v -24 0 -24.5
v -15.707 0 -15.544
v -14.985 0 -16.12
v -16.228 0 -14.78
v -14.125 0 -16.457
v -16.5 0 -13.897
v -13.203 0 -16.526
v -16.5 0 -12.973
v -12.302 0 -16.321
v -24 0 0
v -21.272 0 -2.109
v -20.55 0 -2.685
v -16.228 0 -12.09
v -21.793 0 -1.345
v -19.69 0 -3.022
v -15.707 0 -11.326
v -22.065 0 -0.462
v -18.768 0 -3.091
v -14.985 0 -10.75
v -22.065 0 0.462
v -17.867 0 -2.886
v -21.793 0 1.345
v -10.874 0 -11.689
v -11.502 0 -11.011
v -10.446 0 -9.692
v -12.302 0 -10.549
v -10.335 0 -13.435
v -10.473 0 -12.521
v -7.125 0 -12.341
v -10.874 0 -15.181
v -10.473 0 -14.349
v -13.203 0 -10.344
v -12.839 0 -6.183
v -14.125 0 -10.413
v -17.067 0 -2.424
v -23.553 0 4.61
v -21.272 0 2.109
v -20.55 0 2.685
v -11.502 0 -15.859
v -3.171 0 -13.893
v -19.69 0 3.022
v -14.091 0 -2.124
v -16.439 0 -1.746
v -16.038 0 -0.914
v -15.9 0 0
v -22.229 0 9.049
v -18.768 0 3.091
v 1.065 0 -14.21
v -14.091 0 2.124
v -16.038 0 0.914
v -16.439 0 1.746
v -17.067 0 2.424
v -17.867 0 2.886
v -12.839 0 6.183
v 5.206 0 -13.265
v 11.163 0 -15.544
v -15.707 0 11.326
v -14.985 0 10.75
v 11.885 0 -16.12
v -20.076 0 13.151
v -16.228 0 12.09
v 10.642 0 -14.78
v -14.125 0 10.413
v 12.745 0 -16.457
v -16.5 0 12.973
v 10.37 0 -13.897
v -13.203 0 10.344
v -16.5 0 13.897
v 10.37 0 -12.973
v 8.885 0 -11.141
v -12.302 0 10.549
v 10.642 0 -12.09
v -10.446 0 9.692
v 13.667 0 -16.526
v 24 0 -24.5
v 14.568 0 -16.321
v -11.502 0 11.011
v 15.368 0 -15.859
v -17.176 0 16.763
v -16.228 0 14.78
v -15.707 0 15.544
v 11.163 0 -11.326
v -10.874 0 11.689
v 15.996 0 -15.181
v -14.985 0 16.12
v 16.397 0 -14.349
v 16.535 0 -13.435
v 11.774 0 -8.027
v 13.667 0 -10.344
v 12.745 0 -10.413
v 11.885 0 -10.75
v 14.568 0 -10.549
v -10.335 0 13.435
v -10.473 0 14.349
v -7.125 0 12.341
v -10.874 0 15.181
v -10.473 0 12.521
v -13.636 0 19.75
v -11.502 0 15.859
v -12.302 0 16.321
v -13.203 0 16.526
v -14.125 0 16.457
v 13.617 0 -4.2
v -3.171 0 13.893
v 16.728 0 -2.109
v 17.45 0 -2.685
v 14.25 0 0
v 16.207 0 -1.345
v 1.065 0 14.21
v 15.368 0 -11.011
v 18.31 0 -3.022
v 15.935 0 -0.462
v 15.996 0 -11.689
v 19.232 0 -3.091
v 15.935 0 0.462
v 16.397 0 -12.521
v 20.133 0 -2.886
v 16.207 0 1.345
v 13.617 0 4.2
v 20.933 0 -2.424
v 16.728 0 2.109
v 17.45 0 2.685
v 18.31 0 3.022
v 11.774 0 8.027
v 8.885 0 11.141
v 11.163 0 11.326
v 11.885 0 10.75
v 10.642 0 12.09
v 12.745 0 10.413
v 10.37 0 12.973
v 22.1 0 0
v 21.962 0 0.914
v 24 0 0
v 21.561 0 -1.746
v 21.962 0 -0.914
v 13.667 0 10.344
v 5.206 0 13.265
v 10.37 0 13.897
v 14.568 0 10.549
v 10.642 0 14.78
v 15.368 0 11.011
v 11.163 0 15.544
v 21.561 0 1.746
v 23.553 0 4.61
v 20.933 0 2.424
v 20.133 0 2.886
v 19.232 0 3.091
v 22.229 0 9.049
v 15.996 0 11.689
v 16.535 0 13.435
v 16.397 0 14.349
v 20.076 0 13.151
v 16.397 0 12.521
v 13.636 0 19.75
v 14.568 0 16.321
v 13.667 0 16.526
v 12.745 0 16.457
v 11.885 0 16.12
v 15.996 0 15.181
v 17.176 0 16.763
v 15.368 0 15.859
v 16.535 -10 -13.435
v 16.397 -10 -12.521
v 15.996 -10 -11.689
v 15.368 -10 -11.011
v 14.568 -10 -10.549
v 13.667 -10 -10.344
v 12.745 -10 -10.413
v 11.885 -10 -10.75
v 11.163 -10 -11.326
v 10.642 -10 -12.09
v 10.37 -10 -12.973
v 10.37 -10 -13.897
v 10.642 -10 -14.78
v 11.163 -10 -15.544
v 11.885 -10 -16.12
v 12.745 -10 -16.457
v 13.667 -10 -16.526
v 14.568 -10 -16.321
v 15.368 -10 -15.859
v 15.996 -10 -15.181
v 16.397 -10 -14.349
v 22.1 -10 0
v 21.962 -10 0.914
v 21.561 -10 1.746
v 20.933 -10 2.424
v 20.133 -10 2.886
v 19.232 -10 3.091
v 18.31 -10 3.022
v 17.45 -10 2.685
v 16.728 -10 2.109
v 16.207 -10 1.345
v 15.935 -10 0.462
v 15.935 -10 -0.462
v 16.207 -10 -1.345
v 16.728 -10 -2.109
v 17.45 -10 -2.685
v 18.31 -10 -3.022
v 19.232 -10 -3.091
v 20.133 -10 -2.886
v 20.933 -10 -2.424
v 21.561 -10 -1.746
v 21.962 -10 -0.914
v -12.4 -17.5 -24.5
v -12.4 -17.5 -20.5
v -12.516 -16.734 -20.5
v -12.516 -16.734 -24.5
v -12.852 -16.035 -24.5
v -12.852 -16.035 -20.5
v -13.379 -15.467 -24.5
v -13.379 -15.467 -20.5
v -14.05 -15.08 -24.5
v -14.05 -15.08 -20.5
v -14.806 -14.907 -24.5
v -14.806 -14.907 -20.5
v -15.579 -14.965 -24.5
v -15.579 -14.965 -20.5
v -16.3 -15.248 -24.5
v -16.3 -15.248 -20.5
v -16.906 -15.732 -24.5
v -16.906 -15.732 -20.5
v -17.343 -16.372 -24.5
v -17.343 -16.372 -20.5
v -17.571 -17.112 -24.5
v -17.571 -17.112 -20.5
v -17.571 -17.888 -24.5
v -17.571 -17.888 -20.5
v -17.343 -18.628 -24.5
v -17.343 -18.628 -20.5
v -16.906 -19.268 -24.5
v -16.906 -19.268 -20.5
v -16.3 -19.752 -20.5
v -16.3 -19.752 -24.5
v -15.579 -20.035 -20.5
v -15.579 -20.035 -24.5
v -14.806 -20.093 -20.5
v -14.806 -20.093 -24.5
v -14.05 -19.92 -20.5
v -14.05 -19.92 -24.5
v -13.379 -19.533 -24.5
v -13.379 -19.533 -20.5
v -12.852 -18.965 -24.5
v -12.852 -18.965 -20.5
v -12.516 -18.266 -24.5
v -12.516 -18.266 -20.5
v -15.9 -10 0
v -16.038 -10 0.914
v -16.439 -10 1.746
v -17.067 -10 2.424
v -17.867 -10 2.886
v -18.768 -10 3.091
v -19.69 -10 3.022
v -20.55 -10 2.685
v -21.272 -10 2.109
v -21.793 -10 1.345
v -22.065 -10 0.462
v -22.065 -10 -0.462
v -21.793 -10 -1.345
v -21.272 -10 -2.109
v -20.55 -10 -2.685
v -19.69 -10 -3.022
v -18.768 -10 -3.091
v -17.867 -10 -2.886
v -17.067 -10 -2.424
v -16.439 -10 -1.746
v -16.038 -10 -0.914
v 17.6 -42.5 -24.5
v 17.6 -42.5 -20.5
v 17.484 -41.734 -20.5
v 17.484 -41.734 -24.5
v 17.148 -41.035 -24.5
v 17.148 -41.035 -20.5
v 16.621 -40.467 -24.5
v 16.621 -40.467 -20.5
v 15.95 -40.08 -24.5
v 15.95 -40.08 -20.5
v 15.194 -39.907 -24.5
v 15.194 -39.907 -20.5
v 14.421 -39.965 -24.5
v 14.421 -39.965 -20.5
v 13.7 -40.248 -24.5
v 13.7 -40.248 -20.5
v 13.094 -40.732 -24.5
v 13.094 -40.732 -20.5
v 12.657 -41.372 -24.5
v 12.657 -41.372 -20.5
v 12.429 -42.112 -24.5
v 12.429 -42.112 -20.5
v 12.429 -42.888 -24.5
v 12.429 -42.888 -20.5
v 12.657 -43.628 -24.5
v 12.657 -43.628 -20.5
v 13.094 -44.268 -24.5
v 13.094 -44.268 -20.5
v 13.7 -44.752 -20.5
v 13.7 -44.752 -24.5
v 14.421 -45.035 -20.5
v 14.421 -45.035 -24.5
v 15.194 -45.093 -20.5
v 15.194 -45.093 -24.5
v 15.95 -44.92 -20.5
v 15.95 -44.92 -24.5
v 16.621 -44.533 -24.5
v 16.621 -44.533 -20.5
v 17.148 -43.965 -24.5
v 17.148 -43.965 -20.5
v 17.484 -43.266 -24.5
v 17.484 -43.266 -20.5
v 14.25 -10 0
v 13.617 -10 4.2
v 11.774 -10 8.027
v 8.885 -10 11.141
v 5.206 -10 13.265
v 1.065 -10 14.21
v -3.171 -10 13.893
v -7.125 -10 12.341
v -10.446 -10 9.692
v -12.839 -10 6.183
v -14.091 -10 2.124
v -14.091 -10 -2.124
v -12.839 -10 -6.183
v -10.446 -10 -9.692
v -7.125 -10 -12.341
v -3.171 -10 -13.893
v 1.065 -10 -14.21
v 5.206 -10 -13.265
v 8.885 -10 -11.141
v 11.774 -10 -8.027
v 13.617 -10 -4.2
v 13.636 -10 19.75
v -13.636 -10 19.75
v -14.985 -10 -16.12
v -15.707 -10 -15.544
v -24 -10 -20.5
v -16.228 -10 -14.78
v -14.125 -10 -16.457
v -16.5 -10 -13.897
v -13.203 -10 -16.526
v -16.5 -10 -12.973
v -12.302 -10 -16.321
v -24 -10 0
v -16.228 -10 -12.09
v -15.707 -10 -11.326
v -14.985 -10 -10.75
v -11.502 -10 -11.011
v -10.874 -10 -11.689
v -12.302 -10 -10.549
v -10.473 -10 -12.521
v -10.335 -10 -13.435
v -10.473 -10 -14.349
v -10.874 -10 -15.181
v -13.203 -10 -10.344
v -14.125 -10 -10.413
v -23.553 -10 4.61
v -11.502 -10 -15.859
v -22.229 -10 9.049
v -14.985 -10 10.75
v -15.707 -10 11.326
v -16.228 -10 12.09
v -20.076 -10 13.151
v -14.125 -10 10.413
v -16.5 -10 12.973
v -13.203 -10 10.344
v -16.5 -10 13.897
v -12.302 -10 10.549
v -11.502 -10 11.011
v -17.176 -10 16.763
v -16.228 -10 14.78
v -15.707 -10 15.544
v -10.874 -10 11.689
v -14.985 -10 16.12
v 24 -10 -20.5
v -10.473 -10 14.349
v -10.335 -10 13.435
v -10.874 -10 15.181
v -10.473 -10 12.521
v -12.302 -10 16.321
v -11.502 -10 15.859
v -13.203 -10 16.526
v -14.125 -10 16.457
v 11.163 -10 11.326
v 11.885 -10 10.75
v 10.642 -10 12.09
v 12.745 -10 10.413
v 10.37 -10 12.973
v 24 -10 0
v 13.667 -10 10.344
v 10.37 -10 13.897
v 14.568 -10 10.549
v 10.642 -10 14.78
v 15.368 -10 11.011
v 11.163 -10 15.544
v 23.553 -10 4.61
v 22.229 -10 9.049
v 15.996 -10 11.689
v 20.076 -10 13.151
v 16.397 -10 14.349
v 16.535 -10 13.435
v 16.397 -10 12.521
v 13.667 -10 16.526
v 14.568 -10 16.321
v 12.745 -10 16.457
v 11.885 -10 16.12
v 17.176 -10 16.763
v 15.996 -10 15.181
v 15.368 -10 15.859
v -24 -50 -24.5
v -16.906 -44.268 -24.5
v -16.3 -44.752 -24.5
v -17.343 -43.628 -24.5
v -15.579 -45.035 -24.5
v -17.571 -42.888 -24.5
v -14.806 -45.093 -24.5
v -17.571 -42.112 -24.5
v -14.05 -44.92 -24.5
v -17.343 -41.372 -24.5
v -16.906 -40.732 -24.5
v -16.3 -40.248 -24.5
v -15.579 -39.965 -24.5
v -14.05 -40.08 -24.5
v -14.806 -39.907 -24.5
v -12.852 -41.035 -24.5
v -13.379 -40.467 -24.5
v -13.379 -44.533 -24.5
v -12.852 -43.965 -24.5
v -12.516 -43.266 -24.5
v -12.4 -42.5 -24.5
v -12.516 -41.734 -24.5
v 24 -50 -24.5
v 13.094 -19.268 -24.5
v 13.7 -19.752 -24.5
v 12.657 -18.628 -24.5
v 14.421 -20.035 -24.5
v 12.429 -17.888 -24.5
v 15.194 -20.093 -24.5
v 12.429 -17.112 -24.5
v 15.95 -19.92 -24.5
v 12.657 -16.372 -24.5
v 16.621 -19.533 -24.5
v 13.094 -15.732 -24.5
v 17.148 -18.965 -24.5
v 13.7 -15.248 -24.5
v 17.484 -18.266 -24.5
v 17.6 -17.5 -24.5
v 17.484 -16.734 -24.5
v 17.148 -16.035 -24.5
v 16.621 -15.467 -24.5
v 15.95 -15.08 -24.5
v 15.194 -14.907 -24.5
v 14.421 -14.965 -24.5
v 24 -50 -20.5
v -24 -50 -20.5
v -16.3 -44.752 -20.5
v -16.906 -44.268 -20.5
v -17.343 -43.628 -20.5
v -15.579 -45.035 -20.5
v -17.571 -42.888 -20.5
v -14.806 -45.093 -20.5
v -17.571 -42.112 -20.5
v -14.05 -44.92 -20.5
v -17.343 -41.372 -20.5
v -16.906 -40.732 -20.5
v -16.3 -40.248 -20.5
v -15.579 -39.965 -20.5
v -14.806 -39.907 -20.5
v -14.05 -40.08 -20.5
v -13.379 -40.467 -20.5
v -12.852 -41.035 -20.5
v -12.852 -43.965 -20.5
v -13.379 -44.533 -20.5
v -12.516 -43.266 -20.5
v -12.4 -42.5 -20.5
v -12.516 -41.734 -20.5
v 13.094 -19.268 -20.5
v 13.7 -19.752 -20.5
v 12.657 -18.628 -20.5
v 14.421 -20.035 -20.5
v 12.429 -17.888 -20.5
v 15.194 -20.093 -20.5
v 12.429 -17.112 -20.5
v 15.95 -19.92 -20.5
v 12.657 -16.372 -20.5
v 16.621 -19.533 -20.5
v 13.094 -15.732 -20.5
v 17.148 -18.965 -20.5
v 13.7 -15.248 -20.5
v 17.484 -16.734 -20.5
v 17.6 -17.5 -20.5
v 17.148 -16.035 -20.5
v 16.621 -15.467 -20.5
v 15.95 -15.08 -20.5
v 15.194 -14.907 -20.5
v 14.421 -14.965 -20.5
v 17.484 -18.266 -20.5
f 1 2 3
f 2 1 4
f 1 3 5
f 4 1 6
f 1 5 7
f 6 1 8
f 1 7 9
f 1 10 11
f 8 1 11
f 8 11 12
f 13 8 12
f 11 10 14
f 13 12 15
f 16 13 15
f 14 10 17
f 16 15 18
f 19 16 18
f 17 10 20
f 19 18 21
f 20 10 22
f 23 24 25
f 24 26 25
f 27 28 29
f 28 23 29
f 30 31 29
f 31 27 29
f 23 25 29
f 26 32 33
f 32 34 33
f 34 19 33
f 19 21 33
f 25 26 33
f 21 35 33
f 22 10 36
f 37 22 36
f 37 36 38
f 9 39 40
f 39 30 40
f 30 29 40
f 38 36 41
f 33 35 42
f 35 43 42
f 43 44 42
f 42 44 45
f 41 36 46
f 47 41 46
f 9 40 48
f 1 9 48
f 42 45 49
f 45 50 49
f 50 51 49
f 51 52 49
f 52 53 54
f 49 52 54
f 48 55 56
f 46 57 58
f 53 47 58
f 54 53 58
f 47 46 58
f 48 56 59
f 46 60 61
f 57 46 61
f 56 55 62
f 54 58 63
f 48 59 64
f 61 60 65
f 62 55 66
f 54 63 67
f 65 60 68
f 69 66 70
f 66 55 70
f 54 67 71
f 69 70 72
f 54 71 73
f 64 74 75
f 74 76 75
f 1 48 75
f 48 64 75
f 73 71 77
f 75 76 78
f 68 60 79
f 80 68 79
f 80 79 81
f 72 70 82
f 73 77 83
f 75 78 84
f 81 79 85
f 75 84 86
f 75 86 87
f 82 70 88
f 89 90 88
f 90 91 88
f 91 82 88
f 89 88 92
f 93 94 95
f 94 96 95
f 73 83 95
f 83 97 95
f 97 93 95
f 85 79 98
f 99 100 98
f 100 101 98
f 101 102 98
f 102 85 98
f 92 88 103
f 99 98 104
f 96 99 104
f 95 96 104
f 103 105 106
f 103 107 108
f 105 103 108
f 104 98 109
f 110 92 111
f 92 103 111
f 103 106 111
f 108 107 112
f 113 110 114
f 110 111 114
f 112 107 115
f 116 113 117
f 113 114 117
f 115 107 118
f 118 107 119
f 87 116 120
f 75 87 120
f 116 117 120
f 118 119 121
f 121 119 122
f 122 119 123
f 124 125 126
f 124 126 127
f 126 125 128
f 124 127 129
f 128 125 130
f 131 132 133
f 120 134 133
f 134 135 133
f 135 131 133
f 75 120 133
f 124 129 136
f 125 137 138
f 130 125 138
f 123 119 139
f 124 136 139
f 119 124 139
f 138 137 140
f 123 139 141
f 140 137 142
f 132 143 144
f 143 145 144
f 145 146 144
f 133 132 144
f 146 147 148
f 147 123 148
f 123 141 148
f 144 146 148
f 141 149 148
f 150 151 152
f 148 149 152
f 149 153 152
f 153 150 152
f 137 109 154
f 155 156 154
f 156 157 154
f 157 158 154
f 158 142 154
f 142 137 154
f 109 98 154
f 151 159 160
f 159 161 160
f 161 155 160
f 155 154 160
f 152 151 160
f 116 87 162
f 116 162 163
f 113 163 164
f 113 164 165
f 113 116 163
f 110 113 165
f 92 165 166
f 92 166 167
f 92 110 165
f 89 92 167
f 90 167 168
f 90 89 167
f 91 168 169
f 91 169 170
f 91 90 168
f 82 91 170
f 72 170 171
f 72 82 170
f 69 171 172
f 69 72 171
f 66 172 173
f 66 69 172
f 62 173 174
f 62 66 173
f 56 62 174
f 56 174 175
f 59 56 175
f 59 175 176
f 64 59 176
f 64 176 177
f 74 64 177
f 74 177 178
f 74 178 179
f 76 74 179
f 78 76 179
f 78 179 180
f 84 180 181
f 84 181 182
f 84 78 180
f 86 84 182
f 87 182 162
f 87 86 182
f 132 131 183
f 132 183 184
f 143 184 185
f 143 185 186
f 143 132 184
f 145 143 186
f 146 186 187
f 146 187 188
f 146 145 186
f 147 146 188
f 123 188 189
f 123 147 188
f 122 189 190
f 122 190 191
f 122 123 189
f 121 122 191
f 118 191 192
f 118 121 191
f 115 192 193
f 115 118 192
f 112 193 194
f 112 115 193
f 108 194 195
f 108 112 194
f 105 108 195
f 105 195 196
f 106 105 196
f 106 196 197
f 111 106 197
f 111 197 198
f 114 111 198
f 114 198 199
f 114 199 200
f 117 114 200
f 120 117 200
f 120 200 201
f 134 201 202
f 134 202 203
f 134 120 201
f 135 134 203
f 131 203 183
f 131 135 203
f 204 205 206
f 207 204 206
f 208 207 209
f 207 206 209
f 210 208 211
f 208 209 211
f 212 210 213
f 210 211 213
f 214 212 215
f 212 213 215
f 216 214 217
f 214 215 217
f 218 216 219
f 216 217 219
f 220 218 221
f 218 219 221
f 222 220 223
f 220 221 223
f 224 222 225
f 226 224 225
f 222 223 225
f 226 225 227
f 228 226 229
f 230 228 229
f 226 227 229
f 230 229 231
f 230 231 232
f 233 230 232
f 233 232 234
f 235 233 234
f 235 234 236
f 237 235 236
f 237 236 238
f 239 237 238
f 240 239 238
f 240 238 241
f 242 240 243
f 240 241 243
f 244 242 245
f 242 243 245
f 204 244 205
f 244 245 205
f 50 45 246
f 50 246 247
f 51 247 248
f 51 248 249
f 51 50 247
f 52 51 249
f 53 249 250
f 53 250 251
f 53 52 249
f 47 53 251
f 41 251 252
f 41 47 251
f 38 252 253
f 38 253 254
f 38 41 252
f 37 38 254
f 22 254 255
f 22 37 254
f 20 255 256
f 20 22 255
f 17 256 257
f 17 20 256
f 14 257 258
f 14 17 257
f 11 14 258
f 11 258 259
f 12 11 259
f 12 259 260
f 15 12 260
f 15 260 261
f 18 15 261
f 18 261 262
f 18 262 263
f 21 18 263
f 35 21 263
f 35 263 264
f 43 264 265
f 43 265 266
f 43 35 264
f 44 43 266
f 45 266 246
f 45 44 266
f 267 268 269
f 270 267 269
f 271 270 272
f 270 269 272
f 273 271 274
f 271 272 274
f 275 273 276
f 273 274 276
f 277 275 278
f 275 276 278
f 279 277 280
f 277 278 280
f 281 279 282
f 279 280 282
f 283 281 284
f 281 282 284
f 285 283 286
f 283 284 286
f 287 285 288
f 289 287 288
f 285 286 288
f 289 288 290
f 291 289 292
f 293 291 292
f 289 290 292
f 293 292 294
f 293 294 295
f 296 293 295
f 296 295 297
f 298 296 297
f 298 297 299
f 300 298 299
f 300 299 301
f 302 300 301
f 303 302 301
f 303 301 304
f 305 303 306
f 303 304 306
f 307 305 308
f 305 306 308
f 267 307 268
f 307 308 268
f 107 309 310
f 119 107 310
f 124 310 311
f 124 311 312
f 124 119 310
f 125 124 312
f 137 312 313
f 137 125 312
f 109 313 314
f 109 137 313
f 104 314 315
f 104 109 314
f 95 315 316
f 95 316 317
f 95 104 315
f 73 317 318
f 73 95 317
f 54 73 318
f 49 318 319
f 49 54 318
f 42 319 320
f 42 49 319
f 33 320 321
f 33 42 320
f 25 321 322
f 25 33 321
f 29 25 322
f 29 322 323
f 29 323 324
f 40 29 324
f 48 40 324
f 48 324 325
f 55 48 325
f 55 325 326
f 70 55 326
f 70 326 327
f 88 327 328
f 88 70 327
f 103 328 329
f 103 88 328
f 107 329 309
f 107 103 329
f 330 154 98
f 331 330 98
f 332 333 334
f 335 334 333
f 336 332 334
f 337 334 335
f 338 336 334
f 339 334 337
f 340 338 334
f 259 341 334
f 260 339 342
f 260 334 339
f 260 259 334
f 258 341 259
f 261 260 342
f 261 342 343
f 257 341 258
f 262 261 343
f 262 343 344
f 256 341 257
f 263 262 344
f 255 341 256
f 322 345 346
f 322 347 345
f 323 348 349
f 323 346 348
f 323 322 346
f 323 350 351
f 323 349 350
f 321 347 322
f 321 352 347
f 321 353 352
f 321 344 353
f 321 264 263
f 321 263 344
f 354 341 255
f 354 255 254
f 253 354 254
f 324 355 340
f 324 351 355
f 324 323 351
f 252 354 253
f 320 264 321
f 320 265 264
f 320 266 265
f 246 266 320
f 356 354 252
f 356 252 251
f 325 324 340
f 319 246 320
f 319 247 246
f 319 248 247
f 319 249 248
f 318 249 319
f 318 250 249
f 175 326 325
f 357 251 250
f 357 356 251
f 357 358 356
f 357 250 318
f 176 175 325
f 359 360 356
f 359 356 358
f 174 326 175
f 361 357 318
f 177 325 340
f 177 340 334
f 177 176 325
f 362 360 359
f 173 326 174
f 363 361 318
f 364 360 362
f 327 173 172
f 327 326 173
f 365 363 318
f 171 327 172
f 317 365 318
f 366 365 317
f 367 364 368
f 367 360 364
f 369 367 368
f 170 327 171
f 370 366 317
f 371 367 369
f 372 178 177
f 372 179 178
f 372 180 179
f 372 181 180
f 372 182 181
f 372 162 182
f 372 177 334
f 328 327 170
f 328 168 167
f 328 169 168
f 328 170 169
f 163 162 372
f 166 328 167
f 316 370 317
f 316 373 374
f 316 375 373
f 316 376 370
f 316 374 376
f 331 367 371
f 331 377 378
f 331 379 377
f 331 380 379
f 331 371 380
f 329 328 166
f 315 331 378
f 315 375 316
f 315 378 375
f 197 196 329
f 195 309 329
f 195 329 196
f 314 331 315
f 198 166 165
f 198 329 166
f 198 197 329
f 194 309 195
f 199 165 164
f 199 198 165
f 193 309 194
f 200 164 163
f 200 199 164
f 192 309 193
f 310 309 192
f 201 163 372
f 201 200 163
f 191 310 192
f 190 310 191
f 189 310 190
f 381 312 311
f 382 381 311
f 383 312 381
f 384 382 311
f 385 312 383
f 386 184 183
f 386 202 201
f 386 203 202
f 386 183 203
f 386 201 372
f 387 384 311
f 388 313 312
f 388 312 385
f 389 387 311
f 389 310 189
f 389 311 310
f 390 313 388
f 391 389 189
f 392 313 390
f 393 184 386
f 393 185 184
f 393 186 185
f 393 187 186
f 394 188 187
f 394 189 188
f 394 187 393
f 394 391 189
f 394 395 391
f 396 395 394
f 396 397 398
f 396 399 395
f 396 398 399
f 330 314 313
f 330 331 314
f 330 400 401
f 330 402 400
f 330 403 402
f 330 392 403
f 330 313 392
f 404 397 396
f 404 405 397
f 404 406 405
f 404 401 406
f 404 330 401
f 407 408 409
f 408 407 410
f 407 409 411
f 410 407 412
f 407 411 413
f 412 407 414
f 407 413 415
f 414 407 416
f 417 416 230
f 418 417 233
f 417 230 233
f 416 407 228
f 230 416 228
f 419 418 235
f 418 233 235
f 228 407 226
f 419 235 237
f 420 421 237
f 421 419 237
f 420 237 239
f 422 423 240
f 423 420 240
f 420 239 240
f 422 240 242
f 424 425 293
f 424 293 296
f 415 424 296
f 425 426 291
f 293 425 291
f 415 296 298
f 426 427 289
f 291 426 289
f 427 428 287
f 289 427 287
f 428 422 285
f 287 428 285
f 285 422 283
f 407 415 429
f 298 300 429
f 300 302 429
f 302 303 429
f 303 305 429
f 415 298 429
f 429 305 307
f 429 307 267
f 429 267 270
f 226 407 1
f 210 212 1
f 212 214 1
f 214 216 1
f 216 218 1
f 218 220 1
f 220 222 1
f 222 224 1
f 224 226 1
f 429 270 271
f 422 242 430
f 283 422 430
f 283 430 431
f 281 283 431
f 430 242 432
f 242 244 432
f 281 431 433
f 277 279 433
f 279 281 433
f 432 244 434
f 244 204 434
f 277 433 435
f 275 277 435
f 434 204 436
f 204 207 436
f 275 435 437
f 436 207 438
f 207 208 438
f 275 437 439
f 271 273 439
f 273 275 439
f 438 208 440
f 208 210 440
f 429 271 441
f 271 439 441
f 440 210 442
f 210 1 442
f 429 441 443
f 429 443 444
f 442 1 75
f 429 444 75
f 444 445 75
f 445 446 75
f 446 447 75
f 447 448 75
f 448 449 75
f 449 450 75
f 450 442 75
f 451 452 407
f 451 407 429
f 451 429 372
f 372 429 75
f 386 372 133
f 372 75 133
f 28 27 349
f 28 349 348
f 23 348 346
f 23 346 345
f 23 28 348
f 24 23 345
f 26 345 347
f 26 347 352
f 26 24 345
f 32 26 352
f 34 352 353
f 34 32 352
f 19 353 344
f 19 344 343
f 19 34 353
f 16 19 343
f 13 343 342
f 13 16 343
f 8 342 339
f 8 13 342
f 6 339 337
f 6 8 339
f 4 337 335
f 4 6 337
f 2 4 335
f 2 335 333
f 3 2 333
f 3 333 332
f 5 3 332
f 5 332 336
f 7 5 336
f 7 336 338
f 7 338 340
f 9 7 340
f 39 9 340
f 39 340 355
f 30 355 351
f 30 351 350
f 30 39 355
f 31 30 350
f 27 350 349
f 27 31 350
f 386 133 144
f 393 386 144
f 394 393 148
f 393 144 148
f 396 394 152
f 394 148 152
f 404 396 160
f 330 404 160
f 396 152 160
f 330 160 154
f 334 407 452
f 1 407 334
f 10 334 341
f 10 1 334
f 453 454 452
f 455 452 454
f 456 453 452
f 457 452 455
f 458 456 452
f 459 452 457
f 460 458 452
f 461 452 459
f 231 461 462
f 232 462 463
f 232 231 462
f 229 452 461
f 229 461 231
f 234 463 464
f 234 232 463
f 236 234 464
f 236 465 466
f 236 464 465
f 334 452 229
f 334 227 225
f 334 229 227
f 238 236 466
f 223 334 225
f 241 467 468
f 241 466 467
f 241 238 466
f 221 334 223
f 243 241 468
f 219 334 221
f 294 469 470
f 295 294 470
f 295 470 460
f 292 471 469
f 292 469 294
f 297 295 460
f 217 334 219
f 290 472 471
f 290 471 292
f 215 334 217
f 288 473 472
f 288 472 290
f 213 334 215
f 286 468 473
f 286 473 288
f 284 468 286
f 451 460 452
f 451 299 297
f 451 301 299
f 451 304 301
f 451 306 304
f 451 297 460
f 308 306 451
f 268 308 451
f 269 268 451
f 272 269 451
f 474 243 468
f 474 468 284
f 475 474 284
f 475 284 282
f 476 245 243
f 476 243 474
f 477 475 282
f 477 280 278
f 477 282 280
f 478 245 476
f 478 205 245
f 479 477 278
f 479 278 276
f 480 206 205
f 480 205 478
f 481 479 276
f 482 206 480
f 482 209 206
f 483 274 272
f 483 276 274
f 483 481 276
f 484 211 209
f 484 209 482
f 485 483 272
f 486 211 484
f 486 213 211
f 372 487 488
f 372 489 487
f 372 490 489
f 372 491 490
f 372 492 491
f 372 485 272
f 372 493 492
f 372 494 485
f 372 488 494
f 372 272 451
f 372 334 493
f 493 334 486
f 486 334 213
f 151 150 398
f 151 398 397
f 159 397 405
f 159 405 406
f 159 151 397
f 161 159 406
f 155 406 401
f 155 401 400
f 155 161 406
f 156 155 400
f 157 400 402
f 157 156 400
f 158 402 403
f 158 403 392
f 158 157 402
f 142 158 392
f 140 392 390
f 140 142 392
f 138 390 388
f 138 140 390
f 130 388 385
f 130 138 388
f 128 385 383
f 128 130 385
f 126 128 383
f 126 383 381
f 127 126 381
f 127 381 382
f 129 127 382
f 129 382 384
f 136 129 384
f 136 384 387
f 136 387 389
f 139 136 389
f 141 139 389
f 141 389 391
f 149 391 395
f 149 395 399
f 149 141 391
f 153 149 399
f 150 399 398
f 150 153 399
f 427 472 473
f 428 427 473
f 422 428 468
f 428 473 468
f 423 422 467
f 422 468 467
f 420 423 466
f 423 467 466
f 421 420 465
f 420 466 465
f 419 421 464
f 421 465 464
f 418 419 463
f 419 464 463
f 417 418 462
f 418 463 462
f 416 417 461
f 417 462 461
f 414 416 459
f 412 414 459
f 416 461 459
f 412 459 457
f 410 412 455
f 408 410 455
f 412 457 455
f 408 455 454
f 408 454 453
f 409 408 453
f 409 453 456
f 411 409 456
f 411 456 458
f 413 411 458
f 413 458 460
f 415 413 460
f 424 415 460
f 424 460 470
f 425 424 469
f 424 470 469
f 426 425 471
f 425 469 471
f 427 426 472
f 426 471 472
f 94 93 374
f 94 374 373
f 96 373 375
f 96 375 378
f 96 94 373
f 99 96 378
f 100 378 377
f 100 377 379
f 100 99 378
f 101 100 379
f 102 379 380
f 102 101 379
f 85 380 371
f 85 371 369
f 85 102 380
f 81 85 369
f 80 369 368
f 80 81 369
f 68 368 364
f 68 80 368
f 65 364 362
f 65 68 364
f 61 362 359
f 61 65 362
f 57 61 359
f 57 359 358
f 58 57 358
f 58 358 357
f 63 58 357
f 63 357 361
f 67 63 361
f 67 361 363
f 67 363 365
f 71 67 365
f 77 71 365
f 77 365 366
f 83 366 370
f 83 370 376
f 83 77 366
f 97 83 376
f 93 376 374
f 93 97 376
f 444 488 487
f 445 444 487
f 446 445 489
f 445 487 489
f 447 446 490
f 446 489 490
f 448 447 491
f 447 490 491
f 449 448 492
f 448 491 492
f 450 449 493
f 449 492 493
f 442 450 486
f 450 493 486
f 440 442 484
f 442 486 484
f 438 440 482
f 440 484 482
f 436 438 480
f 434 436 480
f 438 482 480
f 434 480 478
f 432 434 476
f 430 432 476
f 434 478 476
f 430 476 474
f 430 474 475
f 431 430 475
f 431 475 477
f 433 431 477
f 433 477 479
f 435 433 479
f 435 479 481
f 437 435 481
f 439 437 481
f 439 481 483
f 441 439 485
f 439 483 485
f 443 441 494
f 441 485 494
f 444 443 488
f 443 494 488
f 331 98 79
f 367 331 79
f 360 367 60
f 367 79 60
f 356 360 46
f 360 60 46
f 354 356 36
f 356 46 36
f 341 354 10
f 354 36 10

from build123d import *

# Parameters (mm, degrees)
F0_R     = 3.1
F0_R_2   = 14.25
F1_DEPTH = 10
F2_W     = 48
F2_H     = 4
F3_DEPTH = 40
F4_R     = 2.6
F5_DEPTH = 4


with BuildPart() as f1:
    # F0 (on Front) → F1 (new body)
    with BuildSketch(Plane.XZ):
        with BuildLine():
            Line((13.63589, 19.75), (-13.63589, 19.75))
            ThreePointArc((-13.63589, 19.75), (-21.251604, 11.152099), (-24, 0))
            Line((-24, 0), (-24, -24.5))
            Line((-24, -24.5), (24, -24.5))
            Line((24, -24.5), (24, 0))
            ThreePointArc((24, 0), (21.251604, 11.152099), (13.63589, 19.75))
        make_face()
        with Locations((-13.435029, -13.435029)):
            Circle(F0_R, mode=Mode.SUBTRACT)
        with Locations((13.435029, -13.435029)):
            Circle(F0_R, mode=Mode.SUBTRACT)
        with Locations((-19, 0)):
            Circle(F0_R, mode=Mode.SUBTRACT)
        with Locations((-13.435029, 13.435029)):
            Circle(F0_R, mode=Mode.SUBTRACT)
        Circle(F0_R_2, mode=Mode.SUBTRACT)
        with Locations((19, 0)):
            Circle(F0_R, mode=Mode.SUBTRACT)
        with Locations((13.435029, 13.435029)):
            Circle(F0_R, mode=Mode.SUBTRACT)
    extrude(amount=F1_DEPTH)

    # F2 (on face) → F3 (join)
    with BuildSketch(Plane.XZ.offset(10)):
        with Locations((0, -22.5)):
            Rectangle(F2_W, F2_H)
    extrude(amount=F3_DEPTH)

    # F4 (on face) → F5 (cut, through all)
    with BuildSketch(Plane.XY.offset(-20.5)):
        with Locations((-15, -17.5)):
            Circle(F4_R)
        with Locations((-15, -42.5)):
            Circle(F4_R)
        with Locations((15, -42.5)):
            Circle(F4_R)
        with Locations((15, -17.5)):
            Circle(F4_R)
    extrude(amount=-F5_DEPTH, mode=Mode.SUBTRACT)


solid = f1.part
